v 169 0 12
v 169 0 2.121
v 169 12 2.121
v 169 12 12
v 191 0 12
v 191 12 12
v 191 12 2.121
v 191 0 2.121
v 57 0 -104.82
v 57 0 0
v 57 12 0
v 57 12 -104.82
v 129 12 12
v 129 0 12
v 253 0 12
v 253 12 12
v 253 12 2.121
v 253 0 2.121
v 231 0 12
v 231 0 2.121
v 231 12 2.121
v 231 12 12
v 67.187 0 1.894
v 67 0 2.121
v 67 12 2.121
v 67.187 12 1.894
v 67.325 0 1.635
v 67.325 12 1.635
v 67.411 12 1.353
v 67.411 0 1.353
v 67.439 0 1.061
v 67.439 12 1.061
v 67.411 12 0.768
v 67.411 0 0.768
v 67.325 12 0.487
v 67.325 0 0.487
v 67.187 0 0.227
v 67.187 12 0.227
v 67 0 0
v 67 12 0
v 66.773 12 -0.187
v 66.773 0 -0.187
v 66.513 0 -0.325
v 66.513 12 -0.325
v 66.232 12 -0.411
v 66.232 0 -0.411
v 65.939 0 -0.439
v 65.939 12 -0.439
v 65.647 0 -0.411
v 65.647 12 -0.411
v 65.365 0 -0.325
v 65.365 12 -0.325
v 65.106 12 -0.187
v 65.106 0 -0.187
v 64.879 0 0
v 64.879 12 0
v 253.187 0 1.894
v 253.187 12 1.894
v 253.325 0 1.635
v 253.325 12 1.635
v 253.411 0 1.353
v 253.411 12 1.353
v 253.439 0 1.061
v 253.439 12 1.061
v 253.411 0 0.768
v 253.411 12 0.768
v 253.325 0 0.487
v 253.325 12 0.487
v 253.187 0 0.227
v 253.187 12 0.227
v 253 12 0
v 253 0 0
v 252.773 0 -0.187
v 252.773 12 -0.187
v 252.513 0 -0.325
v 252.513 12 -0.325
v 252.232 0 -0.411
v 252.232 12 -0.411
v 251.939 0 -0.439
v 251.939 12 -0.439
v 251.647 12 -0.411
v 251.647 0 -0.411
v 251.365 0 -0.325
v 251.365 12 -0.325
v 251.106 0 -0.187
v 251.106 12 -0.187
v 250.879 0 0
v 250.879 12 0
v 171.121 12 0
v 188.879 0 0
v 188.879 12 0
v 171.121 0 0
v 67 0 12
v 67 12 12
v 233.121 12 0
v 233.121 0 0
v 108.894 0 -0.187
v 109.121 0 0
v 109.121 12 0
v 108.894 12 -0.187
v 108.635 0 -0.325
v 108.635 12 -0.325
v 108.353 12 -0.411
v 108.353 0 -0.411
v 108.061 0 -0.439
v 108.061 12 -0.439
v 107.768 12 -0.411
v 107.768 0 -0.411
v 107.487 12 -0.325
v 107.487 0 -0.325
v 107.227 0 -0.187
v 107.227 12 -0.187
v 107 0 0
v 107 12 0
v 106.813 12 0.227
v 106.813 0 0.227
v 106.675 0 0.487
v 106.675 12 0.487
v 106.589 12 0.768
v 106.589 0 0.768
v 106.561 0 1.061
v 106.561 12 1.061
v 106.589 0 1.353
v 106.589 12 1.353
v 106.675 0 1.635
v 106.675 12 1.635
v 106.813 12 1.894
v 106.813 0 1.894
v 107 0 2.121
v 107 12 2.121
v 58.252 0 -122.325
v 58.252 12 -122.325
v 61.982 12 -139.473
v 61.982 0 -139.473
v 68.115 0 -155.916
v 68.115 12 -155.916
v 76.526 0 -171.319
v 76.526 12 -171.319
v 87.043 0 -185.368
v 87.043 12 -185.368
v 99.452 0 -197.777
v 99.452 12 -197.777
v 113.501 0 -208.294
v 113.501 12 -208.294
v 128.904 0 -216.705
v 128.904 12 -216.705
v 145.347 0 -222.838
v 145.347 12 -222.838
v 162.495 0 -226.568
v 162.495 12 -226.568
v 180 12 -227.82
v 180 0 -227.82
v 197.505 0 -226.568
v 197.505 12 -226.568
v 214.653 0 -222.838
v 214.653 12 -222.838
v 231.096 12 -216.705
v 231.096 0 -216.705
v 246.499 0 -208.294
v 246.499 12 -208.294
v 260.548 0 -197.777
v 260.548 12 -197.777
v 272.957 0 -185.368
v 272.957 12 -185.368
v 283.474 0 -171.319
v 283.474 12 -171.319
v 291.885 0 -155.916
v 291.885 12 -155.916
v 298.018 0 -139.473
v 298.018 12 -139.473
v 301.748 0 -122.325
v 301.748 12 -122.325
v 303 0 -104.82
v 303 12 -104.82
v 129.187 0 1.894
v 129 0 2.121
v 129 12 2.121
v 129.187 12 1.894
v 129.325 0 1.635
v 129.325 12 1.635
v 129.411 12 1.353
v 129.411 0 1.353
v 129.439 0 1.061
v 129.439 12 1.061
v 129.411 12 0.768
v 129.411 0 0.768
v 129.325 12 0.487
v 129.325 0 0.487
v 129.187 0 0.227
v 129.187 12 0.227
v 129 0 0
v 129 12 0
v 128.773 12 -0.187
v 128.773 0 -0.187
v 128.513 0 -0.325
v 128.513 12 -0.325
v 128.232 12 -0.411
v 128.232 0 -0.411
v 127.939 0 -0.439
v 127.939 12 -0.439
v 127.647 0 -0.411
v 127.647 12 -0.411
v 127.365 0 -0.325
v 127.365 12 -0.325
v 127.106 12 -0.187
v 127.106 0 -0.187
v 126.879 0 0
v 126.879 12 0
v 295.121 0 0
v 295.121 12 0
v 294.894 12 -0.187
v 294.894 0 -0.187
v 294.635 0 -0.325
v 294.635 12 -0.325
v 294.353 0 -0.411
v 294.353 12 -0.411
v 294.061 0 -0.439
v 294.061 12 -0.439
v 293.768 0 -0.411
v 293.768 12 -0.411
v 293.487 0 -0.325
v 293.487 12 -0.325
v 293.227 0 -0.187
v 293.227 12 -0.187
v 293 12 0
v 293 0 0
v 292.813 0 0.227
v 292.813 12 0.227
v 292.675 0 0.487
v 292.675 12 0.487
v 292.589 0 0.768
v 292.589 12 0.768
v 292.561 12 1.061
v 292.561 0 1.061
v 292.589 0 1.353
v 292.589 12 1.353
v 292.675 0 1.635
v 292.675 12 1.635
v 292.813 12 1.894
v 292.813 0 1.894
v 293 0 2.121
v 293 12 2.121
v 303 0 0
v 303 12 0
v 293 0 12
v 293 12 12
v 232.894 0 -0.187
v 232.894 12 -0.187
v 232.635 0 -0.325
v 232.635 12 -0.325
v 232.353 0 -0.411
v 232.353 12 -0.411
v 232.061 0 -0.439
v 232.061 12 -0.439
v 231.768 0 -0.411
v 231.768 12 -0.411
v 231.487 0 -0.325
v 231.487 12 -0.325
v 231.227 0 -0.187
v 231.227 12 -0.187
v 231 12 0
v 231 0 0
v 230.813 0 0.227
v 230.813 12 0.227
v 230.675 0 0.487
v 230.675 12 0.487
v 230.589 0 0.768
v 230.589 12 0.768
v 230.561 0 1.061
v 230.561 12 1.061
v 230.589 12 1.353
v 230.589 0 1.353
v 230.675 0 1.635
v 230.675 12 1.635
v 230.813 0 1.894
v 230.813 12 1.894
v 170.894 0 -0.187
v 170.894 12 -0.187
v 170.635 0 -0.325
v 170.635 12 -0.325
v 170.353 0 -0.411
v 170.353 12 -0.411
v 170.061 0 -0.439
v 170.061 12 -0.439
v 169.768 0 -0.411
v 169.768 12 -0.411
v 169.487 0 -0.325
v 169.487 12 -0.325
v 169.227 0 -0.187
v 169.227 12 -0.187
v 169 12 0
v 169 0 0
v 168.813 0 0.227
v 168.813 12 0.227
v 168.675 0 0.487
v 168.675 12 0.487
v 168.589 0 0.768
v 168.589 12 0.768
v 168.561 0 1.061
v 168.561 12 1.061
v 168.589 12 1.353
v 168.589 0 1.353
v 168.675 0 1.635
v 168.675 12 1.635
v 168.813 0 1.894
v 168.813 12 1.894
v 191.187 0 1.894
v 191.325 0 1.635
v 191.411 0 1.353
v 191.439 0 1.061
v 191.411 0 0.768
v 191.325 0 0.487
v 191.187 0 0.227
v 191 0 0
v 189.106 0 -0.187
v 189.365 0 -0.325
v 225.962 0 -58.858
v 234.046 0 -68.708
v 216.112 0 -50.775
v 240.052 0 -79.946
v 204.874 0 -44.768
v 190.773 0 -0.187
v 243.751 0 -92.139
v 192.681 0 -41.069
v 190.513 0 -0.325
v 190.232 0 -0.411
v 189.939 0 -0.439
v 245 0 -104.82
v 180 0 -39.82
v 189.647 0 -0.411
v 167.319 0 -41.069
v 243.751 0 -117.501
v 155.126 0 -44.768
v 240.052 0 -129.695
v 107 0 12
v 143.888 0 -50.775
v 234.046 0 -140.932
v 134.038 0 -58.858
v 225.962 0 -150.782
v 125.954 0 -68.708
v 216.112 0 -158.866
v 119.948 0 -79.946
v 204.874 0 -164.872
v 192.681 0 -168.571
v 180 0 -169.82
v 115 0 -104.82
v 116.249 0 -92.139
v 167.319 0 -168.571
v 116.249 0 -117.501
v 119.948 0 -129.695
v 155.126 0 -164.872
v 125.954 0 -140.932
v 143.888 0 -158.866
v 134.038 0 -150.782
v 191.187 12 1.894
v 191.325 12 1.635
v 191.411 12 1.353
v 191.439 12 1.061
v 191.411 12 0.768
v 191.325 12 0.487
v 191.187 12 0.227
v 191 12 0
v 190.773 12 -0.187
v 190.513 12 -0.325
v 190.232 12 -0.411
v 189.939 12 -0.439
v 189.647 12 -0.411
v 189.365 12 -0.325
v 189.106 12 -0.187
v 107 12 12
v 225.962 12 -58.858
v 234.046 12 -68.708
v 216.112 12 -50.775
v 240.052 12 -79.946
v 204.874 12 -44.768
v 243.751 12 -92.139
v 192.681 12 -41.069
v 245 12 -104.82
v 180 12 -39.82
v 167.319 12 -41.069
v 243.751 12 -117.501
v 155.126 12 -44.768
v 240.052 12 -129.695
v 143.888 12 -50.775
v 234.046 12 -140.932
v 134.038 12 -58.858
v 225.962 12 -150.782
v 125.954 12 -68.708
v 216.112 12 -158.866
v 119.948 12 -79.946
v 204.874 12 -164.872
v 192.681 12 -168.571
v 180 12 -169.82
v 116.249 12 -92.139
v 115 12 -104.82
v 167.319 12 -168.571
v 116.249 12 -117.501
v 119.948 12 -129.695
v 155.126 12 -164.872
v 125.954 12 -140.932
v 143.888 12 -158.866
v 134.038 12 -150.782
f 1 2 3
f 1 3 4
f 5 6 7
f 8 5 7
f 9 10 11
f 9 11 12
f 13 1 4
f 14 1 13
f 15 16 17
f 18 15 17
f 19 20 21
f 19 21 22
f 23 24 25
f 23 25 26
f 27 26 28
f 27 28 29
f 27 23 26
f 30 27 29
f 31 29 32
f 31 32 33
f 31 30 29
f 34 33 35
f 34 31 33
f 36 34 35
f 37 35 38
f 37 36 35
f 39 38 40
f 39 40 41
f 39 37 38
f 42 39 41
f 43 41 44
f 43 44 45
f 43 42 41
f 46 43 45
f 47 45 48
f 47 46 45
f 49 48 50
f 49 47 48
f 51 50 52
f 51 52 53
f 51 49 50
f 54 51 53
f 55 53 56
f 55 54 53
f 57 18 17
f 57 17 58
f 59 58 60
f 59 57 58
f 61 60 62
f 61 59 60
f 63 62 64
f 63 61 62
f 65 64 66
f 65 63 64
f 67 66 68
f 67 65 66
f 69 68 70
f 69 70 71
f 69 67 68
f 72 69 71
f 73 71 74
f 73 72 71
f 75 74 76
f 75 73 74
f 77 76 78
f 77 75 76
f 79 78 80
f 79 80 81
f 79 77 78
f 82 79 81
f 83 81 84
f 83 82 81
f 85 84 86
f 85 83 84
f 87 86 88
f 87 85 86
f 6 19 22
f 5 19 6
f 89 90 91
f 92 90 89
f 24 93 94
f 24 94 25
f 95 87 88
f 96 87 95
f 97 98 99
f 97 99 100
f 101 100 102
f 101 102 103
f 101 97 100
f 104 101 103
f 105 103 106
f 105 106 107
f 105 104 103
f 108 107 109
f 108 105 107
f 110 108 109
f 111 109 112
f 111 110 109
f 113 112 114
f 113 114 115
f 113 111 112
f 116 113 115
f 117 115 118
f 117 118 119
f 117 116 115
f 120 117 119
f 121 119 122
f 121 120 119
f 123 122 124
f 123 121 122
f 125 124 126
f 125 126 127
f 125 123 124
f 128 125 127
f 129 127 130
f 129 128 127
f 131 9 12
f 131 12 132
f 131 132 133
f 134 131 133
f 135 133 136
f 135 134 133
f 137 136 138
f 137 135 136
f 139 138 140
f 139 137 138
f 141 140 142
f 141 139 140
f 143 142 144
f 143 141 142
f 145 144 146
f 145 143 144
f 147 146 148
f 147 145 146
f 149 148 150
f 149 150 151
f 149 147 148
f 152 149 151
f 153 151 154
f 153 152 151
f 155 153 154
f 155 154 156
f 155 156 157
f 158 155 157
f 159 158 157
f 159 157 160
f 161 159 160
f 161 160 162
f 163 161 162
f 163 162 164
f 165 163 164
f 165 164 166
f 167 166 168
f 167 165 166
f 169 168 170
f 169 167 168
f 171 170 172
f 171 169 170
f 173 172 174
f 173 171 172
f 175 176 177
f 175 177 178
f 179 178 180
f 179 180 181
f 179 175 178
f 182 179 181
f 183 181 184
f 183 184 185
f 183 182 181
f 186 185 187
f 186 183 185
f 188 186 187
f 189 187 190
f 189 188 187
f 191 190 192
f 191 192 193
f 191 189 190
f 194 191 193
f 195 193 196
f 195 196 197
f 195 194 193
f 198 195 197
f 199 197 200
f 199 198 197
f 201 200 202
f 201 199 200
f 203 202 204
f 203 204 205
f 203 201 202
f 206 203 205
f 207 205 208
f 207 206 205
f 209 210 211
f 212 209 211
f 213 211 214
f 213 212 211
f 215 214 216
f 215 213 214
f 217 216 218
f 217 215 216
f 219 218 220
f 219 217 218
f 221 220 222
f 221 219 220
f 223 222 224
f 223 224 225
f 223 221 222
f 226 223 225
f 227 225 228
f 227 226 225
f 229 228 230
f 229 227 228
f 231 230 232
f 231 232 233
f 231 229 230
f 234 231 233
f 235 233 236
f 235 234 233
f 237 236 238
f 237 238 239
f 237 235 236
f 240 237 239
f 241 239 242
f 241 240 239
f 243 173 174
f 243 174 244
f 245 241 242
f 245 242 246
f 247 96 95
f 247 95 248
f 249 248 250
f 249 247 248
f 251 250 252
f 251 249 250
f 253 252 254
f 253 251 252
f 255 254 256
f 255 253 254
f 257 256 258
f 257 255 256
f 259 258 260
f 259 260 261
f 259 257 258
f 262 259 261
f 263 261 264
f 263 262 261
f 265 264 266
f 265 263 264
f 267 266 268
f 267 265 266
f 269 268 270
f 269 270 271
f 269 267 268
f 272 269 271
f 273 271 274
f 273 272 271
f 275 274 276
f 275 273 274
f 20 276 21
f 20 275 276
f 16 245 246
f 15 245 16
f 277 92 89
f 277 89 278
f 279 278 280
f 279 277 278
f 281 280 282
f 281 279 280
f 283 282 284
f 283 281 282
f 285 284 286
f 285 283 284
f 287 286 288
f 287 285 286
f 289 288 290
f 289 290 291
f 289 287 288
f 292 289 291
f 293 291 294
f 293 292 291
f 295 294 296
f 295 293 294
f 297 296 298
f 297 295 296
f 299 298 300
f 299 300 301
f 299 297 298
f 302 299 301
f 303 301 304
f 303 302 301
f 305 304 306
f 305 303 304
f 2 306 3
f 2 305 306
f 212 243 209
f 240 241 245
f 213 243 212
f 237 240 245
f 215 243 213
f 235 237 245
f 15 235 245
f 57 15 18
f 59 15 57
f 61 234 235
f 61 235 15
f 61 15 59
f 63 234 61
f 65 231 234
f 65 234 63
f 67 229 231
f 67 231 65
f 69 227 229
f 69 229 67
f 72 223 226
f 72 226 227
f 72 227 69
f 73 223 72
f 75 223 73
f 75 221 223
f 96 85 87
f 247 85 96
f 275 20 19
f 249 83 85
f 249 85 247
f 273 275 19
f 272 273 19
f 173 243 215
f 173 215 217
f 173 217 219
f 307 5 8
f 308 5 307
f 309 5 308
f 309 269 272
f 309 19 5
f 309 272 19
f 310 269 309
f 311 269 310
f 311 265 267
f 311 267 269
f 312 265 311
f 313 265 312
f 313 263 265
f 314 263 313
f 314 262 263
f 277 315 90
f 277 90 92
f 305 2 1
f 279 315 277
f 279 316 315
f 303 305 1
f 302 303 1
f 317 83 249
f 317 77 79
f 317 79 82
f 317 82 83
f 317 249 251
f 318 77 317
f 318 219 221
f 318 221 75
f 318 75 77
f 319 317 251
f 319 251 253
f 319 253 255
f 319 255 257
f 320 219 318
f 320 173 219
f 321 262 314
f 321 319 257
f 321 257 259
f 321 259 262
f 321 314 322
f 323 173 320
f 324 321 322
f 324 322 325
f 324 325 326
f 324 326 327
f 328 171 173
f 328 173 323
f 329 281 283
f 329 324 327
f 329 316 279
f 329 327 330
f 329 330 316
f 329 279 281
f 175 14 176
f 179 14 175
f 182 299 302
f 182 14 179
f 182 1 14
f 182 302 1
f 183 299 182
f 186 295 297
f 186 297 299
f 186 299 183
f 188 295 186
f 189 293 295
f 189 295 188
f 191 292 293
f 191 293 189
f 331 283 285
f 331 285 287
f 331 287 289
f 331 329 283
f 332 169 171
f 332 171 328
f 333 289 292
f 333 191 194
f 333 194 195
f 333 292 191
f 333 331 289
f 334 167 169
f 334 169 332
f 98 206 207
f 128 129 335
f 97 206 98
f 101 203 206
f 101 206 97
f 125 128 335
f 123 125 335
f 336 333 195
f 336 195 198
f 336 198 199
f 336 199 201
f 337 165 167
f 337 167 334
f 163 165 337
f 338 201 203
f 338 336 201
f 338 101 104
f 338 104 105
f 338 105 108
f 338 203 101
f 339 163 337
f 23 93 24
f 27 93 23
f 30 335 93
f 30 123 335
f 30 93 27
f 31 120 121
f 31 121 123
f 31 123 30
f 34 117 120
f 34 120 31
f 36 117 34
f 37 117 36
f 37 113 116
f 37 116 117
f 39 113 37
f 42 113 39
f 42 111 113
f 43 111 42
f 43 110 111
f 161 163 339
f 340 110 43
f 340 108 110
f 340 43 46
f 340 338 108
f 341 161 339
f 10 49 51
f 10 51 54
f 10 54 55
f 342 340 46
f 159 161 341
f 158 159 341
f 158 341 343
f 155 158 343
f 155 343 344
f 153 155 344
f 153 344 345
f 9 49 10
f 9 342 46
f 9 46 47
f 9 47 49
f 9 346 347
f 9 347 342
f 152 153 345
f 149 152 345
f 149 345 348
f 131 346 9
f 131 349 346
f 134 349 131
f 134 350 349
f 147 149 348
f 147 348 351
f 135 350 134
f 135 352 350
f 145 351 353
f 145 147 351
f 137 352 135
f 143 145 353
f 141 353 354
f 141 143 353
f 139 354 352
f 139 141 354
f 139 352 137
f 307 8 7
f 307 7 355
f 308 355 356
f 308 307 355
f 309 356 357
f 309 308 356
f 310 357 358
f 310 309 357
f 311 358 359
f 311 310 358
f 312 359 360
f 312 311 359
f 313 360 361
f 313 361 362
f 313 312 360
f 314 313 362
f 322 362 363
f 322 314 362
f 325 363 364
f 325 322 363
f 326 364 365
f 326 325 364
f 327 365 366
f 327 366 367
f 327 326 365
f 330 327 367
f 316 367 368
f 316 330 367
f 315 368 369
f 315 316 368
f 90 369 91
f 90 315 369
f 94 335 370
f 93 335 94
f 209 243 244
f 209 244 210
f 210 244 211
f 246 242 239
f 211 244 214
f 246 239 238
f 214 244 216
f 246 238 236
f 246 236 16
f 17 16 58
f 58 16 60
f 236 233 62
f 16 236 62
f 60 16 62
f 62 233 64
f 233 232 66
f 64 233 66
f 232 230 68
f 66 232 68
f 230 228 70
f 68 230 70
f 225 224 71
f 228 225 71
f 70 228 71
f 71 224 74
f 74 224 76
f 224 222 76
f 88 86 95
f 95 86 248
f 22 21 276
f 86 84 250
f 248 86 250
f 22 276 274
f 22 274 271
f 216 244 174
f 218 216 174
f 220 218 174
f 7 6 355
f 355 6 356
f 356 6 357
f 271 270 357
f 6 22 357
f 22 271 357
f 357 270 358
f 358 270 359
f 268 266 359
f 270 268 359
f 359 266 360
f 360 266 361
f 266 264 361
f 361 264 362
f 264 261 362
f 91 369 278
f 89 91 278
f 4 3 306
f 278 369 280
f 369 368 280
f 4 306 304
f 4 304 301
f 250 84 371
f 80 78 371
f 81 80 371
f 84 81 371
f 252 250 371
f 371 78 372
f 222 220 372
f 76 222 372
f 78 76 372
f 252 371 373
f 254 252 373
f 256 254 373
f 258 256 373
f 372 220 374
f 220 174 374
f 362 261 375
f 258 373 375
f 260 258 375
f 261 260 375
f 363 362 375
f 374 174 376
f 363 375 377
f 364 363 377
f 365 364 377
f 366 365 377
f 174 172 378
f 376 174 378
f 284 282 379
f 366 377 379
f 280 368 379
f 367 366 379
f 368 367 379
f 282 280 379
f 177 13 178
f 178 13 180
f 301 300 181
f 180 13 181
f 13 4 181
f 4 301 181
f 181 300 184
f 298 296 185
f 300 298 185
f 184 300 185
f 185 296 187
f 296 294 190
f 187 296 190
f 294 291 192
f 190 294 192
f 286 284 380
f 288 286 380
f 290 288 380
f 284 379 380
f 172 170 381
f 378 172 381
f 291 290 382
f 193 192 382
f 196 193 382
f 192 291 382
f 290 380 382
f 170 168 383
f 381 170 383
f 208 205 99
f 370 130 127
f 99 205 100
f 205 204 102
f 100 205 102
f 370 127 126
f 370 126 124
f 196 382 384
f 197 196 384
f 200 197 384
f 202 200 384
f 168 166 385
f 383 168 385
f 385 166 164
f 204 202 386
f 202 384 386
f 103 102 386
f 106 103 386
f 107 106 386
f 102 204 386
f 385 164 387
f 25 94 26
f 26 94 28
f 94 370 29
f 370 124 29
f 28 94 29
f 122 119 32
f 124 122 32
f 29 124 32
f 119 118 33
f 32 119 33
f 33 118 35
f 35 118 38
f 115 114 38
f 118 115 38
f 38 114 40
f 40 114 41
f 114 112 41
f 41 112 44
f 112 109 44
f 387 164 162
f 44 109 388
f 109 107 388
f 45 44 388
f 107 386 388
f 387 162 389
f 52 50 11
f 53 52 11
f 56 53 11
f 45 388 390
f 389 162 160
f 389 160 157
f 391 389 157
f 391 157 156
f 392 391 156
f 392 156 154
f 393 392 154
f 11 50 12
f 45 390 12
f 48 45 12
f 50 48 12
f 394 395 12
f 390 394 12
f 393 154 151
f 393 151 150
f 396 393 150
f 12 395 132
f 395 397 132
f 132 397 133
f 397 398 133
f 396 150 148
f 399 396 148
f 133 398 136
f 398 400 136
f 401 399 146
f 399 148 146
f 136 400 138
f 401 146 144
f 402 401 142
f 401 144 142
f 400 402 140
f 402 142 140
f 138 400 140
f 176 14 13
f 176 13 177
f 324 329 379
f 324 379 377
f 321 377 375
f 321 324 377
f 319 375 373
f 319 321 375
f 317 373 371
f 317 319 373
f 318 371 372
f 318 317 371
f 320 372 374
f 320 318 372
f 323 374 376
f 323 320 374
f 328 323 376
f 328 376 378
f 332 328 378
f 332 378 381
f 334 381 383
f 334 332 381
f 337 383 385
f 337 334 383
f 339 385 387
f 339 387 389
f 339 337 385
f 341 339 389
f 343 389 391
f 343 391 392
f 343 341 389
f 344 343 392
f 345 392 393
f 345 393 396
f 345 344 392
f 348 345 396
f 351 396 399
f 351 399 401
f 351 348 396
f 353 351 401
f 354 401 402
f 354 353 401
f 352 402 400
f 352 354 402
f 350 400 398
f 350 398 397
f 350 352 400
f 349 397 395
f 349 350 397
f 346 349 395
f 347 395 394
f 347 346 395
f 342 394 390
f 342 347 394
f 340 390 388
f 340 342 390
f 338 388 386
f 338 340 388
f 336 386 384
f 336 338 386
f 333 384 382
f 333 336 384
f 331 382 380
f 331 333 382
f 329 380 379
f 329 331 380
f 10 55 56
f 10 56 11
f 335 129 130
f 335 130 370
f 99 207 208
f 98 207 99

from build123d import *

# Parameters (mm, degrees)
CROQUIS1_R              = 65
SALIENTE_EXTRUIR2_DEPTH = 12


with BuildPart() as part:
    # Croquis1 → Saliente-Extruir2 (new body)
    with BuildSketch(Plane(origin=(0, 0, 0), x_dir=(1, 0, 0), z_dir=(0, 1, 0))):
        with BuildLine():
            Line((57, 0), (57, 104.820295074))
            ThreePointArc((57, 104.820295074), (180, 227.820295074), (303, 104.820295074))
            Line((303, 104.820295074), (303, 0))
            Line((303, 0), (295.121320344, 0))
            ThreePointArc((295.121320344, 0), (293, 0), (293, -2.121320344))
            Line((293, -2.121320344), (293, -12))
            Line((293, -12), (253, -12))
            Line((253, -12), (253, -2.121320344))
            ThreePointArc((253, -2.121320344), (253, 0), (250.878679656, 0))
            Line((250.878679656, 0), (233.121320344, 0))
            ThreePointArc((233.121320344, 0), (231, 0), (231, -2.121320344))
            Line((231, -2.121320344), (231, -12))
            Line((231, -12), (191, -12))
            Line((191, -12), (191, -2.121320344))
            ThreePointArc((191, -2.121320344), (191, 0), (188.878679656, 0))
            Line((188.878679656, 0), (171.121320344, 0))
            ThreePointArc((171.121320344, 0), (169, 0), (169, -2.121320344))
            Line((169, -2.121320344), (169, -12))
            Line((169, -12), (129, -12))
            Line((129, -12), (129, -2.121320344))
            ThreePointArc((129, -2.121320344), (129, 0), (126.878679656, 0))
            Line((126.878679656, 0), (109.121320344, 0))
            ThreePointArc((109.121320344, 0), (107, 0), (107, -2.121320344))
            Line((107, -2.121320344), (107, -12))
            Line((107, -12), (67, -12))
            Line((67, -12), (67, -2.121320344))
            ThreePointArc((67, -2.121320344), (67, 0), (64.878679656, 0))
            Line((64.878679656, 0), (57, 0))
        make_face()
        with Locations(Location((180, 104.820295074, 0), (0, 0, 270))):
            Circle(CROQUIS1_R, mode=Mode.SUBTRACT)
    extrude(amount=SALIENTE_EXTRUIR2_DEPTH)


solid = part.part
